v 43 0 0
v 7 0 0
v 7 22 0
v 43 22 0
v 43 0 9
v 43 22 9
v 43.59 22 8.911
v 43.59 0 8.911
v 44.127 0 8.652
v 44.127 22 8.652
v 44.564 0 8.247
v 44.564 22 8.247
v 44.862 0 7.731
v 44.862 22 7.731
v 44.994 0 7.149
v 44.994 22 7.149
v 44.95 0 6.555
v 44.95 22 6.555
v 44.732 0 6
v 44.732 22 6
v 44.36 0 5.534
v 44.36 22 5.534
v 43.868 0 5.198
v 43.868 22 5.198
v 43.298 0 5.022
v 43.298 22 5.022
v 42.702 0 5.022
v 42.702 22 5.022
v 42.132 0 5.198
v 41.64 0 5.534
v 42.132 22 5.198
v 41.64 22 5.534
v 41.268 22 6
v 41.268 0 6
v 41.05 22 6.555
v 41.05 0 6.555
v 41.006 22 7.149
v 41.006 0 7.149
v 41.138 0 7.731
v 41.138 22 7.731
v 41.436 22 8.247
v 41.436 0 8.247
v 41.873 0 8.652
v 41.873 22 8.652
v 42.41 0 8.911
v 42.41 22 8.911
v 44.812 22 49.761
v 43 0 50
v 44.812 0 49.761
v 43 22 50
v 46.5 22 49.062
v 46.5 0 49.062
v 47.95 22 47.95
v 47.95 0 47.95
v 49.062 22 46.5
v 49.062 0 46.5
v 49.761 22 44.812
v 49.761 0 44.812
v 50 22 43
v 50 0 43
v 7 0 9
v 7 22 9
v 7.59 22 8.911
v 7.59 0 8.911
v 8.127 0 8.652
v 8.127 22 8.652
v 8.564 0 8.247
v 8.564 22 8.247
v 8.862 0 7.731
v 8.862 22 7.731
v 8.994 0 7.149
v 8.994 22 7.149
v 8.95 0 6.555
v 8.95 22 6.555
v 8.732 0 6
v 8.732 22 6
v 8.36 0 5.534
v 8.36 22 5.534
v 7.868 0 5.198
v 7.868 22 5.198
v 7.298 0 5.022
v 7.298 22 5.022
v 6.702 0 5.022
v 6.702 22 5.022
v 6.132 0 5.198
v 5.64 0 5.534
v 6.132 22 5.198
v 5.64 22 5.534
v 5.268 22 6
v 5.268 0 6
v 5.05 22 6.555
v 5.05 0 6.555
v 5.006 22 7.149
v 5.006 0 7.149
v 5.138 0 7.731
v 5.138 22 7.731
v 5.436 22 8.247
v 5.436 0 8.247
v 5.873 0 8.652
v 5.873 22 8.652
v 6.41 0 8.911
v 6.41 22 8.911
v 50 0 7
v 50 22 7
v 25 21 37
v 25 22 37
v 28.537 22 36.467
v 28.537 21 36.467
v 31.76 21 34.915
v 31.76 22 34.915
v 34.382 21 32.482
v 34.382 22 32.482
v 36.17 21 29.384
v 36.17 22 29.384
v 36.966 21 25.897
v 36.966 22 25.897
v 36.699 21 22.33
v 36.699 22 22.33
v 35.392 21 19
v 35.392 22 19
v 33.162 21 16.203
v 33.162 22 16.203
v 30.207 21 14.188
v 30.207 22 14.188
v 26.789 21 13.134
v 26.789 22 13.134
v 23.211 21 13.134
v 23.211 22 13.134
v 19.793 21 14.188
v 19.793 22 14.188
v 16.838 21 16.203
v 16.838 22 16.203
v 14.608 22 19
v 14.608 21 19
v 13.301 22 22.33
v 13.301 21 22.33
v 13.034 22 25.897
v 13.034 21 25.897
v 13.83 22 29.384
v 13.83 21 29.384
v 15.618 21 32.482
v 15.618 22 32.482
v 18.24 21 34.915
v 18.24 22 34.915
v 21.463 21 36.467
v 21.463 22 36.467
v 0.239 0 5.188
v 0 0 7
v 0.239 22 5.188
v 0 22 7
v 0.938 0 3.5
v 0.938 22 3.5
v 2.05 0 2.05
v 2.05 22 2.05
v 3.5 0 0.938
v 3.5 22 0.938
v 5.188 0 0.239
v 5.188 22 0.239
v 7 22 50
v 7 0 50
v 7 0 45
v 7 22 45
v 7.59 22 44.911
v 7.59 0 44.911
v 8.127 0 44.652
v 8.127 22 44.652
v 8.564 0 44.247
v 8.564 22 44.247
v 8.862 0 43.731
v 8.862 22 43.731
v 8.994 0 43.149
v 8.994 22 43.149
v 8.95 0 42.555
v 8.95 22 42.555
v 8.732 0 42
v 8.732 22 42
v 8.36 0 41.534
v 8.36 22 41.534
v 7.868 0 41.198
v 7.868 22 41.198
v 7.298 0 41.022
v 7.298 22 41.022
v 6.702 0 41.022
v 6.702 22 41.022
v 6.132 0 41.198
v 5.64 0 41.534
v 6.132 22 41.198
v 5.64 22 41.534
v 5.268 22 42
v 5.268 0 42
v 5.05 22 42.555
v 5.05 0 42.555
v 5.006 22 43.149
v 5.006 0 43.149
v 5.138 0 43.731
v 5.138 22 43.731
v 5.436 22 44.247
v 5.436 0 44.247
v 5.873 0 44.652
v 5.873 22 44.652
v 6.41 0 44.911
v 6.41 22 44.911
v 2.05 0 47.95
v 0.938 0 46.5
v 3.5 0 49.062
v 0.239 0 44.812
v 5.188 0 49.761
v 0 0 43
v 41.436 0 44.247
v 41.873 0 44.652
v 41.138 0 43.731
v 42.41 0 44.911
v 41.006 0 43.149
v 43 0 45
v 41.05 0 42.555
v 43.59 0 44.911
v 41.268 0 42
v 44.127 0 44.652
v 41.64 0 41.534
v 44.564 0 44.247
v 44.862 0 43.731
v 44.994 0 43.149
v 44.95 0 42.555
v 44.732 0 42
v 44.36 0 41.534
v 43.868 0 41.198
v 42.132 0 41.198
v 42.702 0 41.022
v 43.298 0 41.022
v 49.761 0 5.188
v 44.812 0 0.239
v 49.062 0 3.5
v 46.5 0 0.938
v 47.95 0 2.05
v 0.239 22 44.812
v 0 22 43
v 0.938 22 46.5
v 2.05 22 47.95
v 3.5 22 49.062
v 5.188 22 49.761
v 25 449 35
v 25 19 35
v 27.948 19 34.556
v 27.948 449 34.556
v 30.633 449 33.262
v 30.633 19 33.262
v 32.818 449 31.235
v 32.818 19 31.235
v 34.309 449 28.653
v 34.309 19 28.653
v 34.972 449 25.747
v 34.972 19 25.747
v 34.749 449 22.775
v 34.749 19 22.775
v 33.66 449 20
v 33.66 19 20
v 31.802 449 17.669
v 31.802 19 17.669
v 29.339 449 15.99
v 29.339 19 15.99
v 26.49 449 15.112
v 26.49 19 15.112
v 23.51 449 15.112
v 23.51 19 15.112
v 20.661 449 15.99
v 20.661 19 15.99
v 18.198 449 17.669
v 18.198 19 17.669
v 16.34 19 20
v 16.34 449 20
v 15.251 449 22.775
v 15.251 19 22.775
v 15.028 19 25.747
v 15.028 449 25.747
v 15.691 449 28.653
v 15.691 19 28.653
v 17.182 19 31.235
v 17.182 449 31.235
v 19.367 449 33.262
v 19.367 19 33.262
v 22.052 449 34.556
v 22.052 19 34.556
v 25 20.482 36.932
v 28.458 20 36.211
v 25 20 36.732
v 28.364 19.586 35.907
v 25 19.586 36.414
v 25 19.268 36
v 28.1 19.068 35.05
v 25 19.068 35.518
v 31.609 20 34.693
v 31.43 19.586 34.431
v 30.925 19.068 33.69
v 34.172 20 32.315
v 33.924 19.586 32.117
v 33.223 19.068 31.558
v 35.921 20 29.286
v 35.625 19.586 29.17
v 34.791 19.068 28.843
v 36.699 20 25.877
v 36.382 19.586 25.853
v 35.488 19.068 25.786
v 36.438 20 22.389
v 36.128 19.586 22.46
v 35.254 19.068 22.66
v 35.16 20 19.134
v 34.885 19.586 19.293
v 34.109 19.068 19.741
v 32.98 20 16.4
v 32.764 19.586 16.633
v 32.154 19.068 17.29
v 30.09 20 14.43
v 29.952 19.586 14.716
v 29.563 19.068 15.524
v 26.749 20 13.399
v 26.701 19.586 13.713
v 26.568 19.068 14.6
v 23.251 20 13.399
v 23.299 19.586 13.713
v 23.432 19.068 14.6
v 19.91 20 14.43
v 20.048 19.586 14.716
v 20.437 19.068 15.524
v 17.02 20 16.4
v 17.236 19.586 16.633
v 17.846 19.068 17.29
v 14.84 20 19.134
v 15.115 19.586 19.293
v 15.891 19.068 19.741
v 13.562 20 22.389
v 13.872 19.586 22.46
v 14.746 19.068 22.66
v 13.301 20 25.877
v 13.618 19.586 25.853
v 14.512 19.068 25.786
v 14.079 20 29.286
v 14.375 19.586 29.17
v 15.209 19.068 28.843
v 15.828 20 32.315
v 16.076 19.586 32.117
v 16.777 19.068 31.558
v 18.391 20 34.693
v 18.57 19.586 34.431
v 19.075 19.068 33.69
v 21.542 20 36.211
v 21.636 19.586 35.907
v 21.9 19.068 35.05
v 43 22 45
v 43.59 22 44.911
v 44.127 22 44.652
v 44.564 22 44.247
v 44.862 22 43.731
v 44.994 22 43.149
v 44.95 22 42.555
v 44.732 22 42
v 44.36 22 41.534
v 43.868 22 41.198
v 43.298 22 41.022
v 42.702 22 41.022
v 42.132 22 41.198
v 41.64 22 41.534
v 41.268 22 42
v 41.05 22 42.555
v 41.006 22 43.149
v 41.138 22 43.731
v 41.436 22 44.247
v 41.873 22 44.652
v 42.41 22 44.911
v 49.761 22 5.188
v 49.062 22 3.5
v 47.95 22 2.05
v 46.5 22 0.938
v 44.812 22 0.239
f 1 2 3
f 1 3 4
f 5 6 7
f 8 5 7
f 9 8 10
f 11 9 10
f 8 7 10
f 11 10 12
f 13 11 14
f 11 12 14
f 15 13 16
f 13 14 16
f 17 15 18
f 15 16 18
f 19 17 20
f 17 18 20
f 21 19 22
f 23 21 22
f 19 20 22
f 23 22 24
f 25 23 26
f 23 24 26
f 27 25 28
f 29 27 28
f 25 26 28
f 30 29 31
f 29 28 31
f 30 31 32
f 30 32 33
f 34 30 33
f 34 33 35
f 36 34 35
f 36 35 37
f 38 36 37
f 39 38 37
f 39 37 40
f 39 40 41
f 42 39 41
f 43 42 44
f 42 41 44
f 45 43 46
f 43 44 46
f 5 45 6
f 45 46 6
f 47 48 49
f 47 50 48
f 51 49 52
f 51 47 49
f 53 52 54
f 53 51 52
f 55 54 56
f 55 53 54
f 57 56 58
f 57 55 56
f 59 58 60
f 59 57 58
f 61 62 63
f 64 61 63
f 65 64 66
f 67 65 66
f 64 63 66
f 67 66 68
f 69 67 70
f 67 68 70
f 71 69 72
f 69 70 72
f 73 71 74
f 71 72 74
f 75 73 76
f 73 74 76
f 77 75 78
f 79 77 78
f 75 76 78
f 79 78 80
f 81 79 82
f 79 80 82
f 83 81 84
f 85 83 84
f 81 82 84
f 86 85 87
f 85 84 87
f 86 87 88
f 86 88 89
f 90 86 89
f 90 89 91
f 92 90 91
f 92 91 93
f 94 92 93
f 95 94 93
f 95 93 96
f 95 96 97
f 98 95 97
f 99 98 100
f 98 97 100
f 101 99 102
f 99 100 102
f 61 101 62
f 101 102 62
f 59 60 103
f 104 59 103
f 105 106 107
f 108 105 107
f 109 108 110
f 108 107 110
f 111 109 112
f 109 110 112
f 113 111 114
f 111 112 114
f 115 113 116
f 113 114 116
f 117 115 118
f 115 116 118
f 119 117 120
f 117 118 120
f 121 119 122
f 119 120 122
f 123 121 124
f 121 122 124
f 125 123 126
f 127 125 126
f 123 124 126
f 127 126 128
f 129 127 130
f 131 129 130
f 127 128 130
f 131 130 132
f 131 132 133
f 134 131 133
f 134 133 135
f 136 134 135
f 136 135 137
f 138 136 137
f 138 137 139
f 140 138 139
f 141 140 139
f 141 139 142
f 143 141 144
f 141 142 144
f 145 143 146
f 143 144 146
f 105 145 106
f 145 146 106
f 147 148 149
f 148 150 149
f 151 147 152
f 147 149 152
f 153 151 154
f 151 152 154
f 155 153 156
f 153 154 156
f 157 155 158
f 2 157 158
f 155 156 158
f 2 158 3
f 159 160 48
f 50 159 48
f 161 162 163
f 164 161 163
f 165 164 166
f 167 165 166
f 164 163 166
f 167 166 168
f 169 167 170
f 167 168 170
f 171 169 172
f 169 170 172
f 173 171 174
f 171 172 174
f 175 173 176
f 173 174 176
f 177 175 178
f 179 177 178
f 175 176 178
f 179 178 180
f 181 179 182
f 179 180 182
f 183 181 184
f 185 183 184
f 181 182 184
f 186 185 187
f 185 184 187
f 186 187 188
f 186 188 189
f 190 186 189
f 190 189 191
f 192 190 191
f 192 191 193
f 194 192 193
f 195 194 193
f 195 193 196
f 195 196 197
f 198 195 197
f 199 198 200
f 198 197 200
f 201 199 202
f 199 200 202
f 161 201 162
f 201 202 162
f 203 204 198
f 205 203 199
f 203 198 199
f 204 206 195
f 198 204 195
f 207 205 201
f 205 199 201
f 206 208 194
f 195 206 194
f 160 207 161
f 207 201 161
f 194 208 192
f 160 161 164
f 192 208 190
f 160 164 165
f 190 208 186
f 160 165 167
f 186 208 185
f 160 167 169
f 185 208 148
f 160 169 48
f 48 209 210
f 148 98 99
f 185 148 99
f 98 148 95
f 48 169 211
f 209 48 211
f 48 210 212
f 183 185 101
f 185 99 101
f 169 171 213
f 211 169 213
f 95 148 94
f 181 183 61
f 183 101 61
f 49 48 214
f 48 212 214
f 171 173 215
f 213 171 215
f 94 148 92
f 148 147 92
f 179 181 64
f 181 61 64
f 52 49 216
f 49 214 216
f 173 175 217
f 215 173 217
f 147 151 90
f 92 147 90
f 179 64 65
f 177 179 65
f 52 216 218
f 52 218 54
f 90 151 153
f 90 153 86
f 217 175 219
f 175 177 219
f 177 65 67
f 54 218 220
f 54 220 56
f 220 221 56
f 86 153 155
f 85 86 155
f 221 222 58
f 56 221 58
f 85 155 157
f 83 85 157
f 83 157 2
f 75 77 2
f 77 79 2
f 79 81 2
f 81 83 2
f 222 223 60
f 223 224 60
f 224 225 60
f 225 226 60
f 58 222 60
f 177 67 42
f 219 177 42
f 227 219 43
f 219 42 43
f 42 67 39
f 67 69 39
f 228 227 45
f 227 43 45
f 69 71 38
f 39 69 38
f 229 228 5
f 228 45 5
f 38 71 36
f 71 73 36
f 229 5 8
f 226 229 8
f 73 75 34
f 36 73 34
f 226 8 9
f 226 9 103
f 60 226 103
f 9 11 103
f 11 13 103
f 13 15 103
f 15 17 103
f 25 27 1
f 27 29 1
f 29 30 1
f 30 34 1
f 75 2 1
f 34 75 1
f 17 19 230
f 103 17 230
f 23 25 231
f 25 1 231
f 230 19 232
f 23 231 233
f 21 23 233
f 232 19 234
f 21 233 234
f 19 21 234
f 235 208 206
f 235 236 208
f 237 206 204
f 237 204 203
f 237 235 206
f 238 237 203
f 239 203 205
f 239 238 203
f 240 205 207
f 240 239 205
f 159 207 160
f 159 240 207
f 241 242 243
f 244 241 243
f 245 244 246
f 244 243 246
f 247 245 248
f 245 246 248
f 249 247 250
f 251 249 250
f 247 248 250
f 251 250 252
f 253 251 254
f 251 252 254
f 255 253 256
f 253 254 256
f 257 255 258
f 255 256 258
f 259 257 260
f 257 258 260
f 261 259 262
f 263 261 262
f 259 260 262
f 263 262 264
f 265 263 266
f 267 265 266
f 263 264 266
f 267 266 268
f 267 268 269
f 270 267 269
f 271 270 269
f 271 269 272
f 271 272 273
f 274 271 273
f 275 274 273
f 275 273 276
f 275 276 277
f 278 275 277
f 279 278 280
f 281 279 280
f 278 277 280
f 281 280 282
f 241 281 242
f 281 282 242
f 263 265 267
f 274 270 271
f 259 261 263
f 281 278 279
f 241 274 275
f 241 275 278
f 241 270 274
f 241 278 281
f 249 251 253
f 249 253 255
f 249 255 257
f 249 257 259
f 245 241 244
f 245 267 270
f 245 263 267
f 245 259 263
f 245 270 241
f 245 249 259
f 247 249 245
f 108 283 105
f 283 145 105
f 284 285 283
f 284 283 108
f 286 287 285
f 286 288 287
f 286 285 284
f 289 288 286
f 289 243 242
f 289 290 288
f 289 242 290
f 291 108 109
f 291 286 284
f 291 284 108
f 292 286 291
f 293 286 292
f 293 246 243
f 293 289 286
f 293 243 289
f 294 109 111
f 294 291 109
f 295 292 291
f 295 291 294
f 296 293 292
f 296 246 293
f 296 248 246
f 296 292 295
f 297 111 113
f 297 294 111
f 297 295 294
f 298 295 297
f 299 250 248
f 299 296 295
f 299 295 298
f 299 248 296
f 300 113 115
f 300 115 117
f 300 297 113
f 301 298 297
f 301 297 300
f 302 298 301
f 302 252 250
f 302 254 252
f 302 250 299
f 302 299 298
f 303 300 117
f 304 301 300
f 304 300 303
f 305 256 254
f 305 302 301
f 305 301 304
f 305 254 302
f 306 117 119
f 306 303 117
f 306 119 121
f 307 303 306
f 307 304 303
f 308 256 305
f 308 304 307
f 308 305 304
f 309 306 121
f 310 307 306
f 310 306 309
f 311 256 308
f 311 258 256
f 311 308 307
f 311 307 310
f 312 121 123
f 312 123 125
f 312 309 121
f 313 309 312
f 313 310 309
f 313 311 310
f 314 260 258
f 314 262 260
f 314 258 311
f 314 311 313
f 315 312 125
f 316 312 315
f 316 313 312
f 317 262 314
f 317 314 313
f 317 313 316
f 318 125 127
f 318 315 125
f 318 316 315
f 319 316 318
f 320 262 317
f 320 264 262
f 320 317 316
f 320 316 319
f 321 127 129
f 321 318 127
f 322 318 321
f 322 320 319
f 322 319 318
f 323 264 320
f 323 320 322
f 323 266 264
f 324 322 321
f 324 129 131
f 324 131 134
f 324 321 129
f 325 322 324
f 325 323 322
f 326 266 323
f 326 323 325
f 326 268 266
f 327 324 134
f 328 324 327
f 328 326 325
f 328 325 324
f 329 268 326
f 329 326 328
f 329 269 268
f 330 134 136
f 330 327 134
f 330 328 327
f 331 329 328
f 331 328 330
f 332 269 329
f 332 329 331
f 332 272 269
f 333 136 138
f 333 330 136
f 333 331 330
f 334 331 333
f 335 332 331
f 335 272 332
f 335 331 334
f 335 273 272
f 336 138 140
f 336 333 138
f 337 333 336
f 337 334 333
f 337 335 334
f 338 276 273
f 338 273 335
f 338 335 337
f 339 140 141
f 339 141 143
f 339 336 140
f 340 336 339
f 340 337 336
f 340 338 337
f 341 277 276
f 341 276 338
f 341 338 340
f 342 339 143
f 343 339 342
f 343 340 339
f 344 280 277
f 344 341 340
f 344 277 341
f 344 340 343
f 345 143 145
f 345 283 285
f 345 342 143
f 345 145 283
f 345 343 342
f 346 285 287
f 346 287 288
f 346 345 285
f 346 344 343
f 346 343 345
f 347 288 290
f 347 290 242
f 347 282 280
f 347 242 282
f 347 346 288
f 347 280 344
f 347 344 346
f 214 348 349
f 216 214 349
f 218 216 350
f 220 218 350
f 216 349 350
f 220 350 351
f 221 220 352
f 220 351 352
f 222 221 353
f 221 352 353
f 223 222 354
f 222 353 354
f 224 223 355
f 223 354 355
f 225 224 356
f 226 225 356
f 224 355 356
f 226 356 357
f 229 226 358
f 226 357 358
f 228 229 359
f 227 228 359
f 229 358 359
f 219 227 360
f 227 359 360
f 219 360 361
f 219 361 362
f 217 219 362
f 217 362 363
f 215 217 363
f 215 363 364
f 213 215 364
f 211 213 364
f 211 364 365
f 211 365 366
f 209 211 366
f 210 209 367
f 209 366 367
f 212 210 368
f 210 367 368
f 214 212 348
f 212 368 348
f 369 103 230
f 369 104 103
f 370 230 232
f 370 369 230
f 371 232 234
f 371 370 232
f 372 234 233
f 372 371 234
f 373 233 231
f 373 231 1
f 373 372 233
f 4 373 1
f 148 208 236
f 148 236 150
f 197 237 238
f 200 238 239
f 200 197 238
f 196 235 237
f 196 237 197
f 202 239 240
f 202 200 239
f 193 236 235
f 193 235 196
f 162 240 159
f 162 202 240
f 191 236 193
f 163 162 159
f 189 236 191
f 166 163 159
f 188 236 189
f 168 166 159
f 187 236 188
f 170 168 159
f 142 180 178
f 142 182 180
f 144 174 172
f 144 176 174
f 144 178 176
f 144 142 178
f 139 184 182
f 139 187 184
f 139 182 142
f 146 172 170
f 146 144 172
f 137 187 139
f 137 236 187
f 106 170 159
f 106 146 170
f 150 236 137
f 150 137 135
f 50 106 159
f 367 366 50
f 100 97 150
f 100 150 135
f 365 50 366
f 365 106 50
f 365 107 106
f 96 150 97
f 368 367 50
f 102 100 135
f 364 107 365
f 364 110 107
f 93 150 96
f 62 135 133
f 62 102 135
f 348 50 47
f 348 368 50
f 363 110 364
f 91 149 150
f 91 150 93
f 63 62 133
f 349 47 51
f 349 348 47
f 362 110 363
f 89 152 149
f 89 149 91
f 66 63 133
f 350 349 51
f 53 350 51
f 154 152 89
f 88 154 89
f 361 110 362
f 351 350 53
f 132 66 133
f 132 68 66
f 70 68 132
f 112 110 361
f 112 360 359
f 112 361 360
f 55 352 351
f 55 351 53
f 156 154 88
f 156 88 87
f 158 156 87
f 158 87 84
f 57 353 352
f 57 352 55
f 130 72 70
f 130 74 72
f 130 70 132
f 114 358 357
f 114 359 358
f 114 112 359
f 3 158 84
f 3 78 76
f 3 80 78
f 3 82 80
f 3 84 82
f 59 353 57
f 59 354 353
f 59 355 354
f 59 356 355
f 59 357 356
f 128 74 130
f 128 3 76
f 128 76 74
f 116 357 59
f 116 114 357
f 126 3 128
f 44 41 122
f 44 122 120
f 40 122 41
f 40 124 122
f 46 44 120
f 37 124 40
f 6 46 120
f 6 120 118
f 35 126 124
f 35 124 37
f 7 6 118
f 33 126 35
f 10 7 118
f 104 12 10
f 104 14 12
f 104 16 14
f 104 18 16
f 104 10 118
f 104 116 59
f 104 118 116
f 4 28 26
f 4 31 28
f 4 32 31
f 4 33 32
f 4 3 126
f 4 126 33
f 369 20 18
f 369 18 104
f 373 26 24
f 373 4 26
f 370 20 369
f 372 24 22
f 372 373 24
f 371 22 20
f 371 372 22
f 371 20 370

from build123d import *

# Parameters (mm, degrees)
SKETCH1_W           = 50
SKETCH1_H           = 50
BOSS_EXTRUDE1_DEPTH = 22
FILLET1_R           = 7
SKETCH2_R           = 2
CUT_EXTRUDE1_DEPTH  = 22
SKETCH3_R           = 12
CUT_EXTRUDE2_DEPTH  = 3
FILLET2_R           = 2
SKETCH4_R           = 10
BOSS_EXTRUDE2_DEPTH = 430


with BuildPart() as part:
    # Sketch1 → Boss-Extrude1 (new body)
    with BuildSketch(Plane(origin=(0, 0, 0), x_dir=(1, 0, 0), z_dir=(0, 1, 0))):
        with Locations((25, -25)):
            Rectangle(SKETCH1_W, SKETCH1_H)
    extrude(amount=BOSS_EXTRUDE1_DEPTH)

    # Fillet1
    fillet1_edges = [part.edges().sort_by_distance(p)[0] for p in [
        (50, 11, 0),
        (50, 11, 50),
        (0, 11, 50),
        (0, 11, 0),
    ]]
    fillet(fillet1_edges, radius=FILLET1_R)

    # Sketch2 → Cut-Extrude1 (cut)
    with BuildSketch(Plane(origin=(0, 22, 0), x_dir=(1, 0, 0), z_dir=(0, 1, 0))):
        with Locations(Location((7, -7, 0), (0, 0, 270))):
            Circle(SKETCH2_R)
        with Locations(Location((7, -43, 0), (0, 0, 270))):
            Circle(SKETCH2_R)
        with Locations(Location((43, -43, 0), (0, 0, 270))):
            Circle(SKETCH2_R)
        with Locations(Location((43, -7, 0), (0, 0, 270))):
            Circle(SKETCH2_R)
    extrude(amount=-CUT_EXTRUDE1_DEPTH, mode=Mode.SUBTRACT)

    # Sketch3 → Cut-Extrude2 (cut)
    with BuildSketch(Plane(origin=(0, 22, 0), x_dir=(1, 0, 0), z_dir=(0, 1, 0))):
        with Locations(Location((25, -25, 0), (0, 0, 270))):
            Circle(SKETCH3_R)
    extrude(amount=-CUT_EXTRUDE2_DEPTH, mode=Mode.SUBTRACT)

    # Fillet2
    fillet2_edges = [part.edges().sort_by_distance(p)[0] for p in [
        (25, 19, 13),
    ]]
    fillet(fillet2_edges, radius=FILLET2_R)

    # Sketch4 → Boss-Extrude2 (add)
    with BuildSketch(Plane(origin=(0, 19, 0), x_dir=(1, 0, 0), z_dir=(0, 1, 0))):
        with Locations(Location((25, -25, 0), (0, 0, 270))):
            Circle(SKETCH4_R)
    extrude(amount=BOSS_EXTRUDE2_DEPTH)


solid = part.part
